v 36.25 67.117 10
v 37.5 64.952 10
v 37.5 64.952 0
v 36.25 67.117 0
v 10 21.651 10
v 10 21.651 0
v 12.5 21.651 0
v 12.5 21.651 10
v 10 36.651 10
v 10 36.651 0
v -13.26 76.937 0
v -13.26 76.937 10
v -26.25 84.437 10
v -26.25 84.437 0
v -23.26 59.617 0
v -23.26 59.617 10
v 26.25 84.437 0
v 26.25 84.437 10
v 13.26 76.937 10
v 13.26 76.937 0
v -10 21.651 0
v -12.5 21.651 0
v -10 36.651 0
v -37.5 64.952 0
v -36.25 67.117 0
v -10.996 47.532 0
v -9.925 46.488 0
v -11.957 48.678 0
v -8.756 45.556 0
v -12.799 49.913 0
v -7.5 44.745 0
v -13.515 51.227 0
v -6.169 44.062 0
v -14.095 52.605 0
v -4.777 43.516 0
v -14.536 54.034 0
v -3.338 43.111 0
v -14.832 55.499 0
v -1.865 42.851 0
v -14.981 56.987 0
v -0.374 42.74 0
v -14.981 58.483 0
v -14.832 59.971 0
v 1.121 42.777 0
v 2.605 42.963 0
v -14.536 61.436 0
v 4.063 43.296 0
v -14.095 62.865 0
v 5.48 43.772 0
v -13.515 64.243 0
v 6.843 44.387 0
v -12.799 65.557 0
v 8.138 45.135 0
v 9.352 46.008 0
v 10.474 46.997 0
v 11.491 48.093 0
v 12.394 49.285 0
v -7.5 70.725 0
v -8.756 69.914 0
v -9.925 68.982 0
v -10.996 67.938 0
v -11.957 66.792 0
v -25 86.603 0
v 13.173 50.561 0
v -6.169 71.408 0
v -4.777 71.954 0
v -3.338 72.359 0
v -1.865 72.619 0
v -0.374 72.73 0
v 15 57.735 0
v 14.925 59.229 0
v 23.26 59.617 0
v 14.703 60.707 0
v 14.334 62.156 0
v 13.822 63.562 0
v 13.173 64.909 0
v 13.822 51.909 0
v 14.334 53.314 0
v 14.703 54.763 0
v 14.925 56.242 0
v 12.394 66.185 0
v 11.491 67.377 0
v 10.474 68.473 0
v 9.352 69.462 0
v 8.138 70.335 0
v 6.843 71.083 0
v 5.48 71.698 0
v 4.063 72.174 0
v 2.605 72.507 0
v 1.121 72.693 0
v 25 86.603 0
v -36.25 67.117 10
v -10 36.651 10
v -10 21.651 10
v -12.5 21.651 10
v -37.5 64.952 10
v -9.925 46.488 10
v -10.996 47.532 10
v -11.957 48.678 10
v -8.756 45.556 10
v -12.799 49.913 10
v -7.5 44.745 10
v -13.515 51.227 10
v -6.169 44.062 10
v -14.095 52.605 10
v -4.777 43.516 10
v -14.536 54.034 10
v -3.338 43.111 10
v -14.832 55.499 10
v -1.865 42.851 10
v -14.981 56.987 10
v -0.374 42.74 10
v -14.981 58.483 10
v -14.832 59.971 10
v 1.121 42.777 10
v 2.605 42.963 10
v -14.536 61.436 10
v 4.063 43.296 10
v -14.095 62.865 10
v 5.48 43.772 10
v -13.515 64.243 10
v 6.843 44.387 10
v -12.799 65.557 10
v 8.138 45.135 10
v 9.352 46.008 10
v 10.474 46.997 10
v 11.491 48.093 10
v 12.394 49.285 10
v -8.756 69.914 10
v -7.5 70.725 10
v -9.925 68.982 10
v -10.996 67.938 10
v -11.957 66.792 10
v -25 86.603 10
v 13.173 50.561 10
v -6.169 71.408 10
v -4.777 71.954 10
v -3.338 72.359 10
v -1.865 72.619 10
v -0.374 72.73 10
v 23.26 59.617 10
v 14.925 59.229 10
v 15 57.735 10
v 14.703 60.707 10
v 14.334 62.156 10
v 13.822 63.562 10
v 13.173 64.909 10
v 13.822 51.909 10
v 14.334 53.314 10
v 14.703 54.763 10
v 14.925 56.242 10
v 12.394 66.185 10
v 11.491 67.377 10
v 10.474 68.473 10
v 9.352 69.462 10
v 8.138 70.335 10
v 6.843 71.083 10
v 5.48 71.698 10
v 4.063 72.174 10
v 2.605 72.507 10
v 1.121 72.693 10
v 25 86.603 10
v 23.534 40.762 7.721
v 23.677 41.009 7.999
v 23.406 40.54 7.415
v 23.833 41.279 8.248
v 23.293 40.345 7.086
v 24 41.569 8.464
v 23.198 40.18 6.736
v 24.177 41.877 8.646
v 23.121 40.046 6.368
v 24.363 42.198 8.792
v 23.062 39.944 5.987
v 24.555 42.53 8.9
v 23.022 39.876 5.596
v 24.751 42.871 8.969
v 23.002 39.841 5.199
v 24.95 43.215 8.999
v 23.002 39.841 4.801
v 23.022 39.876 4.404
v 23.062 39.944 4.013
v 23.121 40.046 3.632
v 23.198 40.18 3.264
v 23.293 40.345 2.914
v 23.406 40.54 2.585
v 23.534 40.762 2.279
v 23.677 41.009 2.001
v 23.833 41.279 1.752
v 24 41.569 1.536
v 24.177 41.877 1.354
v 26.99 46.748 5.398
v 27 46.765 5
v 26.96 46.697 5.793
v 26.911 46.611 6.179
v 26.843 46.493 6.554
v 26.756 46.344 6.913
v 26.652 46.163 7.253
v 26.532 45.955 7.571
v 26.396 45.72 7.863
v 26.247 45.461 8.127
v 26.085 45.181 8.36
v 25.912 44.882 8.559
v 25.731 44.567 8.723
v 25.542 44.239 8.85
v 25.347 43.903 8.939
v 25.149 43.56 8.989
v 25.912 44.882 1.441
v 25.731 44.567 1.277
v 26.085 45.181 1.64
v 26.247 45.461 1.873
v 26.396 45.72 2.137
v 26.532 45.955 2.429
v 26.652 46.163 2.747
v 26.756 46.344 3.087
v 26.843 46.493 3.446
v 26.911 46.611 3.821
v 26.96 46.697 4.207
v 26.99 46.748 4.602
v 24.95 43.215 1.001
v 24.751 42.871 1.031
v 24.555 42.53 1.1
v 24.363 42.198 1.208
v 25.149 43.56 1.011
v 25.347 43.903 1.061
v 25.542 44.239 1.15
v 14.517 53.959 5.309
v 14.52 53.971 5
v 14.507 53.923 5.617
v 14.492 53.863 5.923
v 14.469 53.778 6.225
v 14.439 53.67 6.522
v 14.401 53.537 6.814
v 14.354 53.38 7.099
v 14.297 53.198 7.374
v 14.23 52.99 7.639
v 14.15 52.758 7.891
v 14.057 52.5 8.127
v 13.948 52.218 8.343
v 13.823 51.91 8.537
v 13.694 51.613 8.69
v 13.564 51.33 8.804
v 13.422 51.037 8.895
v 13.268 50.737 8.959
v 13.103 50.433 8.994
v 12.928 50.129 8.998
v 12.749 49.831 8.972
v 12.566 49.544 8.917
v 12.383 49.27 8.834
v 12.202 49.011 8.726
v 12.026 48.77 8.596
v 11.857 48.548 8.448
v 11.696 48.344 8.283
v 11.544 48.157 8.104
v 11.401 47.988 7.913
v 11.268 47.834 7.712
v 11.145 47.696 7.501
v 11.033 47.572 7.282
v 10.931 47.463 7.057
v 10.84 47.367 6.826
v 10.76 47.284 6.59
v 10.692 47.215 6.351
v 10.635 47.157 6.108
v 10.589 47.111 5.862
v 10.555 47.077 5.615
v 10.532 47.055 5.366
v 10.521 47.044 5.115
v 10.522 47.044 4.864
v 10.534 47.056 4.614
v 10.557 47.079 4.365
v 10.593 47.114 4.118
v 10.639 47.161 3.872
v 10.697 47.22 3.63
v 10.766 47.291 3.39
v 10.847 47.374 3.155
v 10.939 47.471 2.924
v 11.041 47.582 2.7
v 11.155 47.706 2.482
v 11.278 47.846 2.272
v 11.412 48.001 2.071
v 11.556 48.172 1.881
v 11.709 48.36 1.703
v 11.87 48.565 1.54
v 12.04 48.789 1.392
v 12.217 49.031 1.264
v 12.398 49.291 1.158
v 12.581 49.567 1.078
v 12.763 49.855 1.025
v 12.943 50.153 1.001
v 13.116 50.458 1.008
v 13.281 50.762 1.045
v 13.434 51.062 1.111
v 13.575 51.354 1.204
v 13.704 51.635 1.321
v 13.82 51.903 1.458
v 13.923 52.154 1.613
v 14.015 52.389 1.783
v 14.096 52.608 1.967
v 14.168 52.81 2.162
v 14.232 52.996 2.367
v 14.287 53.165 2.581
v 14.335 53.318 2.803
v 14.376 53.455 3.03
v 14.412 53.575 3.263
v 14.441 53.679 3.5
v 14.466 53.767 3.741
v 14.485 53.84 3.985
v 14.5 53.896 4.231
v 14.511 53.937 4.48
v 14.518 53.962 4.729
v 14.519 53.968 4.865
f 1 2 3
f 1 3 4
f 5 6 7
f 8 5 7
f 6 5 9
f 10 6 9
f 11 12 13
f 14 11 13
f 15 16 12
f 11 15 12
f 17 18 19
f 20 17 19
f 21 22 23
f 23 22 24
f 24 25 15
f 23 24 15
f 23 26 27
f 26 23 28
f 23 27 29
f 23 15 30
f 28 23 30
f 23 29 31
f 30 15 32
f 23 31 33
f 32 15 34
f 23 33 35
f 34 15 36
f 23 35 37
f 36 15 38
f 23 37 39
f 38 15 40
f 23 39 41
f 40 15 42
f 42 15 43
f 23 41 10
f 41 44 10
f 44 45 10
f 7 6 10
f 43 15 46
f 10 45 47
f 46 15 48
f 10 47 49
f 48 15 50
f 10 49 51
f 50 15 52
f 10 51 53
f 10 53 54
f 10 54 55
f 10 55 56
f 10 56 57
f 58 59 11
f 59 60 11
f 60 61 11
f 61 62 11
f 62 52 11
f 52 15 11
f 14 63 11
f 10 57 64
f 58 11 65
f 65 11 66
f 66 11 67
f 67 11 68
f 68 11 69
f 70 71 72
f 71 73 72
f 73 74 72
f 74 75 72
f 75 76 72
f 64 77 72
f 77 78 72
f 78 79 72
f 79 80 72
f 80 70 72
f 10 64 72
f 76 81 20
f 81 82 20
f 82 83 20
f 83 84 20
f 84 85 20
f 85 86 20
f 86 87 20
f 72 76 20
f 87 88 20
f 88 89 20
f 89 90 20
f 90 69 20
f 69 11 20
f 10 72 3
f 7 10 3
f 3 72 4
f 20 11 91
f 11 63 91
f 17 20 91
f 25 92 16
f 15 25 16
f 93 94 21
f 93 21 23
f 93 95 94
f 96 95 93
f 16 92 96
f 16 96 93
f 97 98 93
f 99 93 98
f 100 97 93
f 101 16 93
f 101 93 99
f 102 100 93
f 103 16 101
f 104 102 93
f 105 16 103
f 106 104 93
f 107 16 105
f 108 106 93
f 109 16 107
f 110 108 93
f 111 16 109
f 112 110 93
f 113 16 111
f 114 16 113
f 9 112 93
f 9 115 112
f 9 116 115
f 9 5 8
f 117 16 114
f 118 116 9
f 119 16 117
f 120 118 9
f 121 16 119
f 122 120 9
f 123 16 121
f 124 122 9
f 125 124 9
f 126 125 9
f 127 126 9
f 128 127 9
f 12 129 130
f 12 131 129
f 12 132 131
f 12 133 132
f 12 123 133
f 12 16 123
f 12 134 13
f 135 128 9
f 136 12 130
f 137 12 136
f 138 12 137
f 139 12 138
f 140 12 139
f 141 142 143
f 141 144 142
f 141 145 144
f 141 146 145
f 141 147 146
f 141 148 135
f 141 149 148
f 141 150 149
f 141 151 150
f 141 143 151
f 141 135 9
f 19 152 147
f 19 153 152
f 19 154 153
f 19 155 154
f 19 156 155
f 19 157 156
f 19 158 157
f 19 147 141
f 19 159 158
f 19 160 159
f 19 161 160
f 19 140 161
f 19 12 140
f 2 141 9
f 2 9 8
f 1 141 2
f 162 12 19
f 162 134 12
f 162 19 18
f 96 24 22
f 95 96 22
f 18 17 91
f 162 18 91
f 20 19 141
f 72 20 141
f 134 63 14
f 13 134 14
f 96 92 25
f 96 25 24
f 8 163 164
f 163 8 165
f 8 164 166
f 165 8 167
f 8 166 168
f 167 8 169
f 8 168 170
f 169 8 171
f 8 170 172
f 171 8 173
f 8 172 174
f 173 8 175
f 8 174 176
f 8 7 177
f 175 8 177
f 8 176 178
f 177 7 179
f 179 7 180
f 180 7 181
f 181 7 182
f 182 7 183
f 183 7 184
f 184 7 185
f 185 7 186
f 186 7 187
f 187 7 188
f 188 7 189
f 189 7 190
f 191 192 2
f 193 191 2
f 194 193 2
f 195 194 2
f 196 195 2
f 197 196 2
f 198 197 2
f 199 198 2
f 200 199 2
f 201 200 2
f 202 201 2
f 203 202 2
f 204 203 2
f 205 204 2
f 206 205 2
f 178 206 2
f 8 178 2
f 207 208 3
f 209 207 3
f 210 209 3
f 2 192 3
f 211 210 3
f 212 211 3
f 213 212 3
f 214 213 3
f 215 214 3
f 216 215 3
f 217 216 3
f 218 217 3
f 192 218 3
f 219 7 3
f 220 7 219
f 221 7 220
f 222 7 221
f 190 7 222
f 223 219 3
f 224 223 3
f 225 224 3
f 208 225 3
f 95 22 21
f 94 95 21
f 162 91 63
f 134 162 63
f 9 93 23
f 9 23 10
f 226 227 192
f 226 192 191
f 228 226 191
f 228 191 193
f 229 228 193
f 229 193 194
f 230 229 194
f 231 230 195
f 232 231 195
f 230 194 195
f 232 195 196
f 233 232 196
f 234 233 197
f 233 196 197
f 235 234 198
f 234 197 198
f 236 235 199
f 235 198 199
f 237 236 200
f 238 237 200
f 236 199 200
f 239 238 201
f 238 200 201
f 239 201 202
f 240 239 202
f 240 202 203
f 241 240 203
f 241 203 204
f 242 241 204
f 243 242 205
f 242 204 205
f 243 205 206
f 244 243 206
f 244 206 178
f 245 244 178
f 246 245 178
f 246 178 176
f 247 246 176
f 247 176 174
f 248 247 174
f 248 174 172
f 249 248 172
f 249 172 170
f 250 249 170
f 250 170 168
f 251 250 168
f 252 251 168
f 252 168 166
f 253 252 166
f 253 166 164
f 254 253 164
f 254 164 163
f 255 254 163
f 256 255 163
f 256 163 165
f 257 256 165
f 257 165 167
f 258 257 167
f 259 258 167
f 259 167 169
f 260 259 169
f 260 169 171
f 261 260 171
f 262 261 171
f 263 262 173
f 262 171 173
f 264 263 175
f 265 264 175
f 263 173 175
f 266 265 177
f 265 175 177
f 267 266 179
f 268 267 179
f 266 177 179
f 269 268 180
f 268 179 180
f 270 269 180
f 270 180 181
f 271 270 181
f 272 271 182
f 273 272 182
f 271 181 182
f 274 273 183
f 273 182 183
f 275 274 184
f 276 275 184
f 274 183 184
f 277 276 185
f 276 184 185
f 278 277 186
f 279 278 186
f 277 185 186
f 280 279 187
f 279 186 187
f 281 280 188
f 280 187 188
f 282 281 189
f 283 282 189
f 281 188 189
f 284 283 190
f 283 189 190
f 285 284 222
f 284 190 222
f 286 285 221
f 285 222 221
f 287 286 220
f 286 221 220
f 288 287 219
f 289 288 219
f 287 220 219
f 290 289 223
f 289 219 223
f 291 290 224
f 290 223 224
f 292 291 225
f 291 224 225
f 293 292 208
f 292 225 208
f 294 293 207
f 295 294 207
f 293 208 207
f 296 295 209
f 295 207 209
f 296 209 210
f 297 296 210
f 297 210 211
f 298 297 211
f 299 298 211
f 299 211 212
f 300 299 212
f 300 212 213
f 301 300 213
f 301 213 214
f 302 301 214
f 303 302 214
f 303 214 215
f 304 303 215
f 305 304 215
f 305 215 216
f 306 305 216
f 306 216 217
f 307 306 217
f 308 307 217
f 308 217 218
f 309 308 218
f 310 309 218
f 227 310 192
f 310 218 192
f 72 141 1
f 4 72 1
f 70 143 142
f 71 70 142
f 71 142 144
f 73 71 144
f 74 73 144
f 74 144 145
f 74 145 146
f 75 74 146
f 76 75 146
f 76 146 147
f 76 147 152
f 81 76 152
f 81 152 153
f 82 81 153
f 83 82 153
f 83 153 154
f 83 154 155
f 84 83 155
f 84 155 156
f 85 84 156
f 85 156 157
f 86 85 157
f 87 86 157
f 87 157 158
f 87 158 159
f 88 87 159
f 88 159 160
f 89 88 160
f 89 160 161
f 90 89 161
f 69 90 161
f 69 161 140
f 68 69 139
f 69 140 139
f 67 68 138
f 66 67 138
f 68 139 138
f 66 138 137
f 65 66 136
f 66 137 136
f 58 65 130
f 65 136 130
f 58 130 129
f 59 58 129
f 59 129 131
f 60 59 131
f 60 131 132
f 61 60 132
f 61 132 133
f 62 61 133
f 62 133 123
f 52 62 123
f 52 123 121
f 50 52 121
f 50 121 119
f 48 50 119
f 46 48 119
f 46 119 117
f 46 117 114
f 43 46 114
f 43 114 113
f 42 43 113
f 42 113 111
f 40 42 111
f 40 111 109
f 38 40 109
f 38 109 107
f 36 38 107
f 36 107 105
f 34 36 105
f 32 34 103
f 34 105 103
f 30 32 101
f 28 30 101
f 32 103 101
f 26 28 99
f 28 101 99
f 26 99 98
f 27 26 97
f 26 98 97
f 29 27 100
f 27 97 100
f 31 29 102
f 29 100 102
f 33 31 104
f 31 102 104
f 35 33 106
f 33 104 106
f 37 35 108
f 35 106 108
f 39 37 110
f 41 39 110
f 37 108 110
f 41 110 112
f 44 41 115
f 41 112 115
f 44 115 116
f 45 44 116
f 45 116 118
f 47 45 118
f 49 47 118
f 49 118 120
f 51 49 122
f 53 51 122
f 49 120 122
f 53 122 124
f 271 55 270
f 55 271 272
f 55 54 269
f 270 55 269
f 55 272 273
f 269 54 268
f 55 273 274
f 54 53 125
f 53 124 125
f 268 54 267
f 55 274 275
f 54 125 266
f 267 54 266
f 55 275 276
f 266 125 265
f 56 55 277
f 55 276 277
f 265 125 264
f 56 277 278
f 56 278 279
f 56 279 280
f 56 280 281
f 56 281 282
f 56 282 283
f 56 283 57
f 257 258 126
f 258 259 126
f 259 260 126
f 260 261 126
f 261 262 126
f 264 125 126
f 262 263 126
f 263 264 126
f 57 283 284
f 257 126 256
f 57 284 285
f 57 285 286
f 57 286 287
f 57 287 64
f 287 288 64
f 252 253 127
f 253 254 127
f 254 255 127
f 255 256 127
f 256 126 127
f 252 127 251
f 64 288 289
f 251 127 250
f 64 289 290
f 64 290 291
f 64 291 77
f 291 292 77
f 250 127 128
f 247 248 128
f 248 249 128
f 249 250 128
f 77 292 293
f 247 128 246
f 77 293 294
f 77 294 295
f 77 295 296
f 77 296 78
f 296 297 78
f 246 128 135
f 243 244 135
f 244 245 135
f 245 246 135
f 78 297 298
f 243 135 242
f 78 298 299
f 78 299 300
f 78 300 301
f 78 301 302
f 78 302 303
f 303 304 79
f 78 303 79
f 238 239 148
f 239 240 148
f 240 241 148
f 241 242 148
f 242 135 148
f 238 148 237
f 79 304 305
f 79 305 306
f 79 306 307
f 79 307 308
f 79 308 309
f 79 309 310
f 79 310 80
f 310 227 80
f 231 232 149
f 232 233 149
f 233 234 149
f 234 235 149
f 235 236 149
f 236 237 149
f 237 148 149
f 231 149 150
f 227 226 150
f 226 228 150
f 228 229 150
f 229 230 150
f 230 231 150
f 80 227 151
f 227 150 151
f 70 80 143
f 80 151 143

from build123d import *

# Parameters (mm, degrees)
F1_DEPTH = 10
F2_W     = 20
F2_H     = 30
F2_R     = 15
F3_DEPTH = 10.001
F4_R     = 4
F5_DEPTH = 15.4106812647


with BuildPart() as f1:
    # F0 (on Top) → F1 (new body)
    with BuildSketch(Plane.XY):
        Polygon((25, 86.6025403784), (-25, 86.6025403784), (-37.5, 64.9519052838), (-12.5, 21.6506350946), (12.5, 21.6506350946), (37.5, 64.9519052838), align=None)
    extrude(amount=F1_DEPTH)

    # F2 (on face) → F3 (cut, through all)
    with BuildSketch(Plane.XY.offset(10)):
        with Locations((0, 21.6506350946)):
            Rectangle(F2_W, F2_H)
        Polygon((-49.2403810568, 74.6169687933), (-23.2596189432, 59.6169687933), (-13.2596189432, 76.937476869), (-39.2403810568, 91.937476869), align=None)
        Polygon((39.2403810568, 91.937476869), (13.2596189432, 76.937476869), (23.2596189432, 59.6169687933), (49.2403810568, 74.6169687933), align=None)
        with Locations((0, 57.735026919)):
            Circle(F2_R)
    extrude(amount=-F3_DEPTH, mode=Mode.SUBTRACT)

    # F4 (on face) → F5 (cut, up to face)
    with BuildSketch(Plane(origin=(0, 0, 0), x_dir=(0.5, 0.8660254038, 0), z_dir=(0.8660254038, -0.5, 0))):
        with Locations((50, 5)):
            Circle(F4_R)
    extrude(amount=-F5_DEPTH, mode=Mode.SUBTRACT)


solid = f1.part
